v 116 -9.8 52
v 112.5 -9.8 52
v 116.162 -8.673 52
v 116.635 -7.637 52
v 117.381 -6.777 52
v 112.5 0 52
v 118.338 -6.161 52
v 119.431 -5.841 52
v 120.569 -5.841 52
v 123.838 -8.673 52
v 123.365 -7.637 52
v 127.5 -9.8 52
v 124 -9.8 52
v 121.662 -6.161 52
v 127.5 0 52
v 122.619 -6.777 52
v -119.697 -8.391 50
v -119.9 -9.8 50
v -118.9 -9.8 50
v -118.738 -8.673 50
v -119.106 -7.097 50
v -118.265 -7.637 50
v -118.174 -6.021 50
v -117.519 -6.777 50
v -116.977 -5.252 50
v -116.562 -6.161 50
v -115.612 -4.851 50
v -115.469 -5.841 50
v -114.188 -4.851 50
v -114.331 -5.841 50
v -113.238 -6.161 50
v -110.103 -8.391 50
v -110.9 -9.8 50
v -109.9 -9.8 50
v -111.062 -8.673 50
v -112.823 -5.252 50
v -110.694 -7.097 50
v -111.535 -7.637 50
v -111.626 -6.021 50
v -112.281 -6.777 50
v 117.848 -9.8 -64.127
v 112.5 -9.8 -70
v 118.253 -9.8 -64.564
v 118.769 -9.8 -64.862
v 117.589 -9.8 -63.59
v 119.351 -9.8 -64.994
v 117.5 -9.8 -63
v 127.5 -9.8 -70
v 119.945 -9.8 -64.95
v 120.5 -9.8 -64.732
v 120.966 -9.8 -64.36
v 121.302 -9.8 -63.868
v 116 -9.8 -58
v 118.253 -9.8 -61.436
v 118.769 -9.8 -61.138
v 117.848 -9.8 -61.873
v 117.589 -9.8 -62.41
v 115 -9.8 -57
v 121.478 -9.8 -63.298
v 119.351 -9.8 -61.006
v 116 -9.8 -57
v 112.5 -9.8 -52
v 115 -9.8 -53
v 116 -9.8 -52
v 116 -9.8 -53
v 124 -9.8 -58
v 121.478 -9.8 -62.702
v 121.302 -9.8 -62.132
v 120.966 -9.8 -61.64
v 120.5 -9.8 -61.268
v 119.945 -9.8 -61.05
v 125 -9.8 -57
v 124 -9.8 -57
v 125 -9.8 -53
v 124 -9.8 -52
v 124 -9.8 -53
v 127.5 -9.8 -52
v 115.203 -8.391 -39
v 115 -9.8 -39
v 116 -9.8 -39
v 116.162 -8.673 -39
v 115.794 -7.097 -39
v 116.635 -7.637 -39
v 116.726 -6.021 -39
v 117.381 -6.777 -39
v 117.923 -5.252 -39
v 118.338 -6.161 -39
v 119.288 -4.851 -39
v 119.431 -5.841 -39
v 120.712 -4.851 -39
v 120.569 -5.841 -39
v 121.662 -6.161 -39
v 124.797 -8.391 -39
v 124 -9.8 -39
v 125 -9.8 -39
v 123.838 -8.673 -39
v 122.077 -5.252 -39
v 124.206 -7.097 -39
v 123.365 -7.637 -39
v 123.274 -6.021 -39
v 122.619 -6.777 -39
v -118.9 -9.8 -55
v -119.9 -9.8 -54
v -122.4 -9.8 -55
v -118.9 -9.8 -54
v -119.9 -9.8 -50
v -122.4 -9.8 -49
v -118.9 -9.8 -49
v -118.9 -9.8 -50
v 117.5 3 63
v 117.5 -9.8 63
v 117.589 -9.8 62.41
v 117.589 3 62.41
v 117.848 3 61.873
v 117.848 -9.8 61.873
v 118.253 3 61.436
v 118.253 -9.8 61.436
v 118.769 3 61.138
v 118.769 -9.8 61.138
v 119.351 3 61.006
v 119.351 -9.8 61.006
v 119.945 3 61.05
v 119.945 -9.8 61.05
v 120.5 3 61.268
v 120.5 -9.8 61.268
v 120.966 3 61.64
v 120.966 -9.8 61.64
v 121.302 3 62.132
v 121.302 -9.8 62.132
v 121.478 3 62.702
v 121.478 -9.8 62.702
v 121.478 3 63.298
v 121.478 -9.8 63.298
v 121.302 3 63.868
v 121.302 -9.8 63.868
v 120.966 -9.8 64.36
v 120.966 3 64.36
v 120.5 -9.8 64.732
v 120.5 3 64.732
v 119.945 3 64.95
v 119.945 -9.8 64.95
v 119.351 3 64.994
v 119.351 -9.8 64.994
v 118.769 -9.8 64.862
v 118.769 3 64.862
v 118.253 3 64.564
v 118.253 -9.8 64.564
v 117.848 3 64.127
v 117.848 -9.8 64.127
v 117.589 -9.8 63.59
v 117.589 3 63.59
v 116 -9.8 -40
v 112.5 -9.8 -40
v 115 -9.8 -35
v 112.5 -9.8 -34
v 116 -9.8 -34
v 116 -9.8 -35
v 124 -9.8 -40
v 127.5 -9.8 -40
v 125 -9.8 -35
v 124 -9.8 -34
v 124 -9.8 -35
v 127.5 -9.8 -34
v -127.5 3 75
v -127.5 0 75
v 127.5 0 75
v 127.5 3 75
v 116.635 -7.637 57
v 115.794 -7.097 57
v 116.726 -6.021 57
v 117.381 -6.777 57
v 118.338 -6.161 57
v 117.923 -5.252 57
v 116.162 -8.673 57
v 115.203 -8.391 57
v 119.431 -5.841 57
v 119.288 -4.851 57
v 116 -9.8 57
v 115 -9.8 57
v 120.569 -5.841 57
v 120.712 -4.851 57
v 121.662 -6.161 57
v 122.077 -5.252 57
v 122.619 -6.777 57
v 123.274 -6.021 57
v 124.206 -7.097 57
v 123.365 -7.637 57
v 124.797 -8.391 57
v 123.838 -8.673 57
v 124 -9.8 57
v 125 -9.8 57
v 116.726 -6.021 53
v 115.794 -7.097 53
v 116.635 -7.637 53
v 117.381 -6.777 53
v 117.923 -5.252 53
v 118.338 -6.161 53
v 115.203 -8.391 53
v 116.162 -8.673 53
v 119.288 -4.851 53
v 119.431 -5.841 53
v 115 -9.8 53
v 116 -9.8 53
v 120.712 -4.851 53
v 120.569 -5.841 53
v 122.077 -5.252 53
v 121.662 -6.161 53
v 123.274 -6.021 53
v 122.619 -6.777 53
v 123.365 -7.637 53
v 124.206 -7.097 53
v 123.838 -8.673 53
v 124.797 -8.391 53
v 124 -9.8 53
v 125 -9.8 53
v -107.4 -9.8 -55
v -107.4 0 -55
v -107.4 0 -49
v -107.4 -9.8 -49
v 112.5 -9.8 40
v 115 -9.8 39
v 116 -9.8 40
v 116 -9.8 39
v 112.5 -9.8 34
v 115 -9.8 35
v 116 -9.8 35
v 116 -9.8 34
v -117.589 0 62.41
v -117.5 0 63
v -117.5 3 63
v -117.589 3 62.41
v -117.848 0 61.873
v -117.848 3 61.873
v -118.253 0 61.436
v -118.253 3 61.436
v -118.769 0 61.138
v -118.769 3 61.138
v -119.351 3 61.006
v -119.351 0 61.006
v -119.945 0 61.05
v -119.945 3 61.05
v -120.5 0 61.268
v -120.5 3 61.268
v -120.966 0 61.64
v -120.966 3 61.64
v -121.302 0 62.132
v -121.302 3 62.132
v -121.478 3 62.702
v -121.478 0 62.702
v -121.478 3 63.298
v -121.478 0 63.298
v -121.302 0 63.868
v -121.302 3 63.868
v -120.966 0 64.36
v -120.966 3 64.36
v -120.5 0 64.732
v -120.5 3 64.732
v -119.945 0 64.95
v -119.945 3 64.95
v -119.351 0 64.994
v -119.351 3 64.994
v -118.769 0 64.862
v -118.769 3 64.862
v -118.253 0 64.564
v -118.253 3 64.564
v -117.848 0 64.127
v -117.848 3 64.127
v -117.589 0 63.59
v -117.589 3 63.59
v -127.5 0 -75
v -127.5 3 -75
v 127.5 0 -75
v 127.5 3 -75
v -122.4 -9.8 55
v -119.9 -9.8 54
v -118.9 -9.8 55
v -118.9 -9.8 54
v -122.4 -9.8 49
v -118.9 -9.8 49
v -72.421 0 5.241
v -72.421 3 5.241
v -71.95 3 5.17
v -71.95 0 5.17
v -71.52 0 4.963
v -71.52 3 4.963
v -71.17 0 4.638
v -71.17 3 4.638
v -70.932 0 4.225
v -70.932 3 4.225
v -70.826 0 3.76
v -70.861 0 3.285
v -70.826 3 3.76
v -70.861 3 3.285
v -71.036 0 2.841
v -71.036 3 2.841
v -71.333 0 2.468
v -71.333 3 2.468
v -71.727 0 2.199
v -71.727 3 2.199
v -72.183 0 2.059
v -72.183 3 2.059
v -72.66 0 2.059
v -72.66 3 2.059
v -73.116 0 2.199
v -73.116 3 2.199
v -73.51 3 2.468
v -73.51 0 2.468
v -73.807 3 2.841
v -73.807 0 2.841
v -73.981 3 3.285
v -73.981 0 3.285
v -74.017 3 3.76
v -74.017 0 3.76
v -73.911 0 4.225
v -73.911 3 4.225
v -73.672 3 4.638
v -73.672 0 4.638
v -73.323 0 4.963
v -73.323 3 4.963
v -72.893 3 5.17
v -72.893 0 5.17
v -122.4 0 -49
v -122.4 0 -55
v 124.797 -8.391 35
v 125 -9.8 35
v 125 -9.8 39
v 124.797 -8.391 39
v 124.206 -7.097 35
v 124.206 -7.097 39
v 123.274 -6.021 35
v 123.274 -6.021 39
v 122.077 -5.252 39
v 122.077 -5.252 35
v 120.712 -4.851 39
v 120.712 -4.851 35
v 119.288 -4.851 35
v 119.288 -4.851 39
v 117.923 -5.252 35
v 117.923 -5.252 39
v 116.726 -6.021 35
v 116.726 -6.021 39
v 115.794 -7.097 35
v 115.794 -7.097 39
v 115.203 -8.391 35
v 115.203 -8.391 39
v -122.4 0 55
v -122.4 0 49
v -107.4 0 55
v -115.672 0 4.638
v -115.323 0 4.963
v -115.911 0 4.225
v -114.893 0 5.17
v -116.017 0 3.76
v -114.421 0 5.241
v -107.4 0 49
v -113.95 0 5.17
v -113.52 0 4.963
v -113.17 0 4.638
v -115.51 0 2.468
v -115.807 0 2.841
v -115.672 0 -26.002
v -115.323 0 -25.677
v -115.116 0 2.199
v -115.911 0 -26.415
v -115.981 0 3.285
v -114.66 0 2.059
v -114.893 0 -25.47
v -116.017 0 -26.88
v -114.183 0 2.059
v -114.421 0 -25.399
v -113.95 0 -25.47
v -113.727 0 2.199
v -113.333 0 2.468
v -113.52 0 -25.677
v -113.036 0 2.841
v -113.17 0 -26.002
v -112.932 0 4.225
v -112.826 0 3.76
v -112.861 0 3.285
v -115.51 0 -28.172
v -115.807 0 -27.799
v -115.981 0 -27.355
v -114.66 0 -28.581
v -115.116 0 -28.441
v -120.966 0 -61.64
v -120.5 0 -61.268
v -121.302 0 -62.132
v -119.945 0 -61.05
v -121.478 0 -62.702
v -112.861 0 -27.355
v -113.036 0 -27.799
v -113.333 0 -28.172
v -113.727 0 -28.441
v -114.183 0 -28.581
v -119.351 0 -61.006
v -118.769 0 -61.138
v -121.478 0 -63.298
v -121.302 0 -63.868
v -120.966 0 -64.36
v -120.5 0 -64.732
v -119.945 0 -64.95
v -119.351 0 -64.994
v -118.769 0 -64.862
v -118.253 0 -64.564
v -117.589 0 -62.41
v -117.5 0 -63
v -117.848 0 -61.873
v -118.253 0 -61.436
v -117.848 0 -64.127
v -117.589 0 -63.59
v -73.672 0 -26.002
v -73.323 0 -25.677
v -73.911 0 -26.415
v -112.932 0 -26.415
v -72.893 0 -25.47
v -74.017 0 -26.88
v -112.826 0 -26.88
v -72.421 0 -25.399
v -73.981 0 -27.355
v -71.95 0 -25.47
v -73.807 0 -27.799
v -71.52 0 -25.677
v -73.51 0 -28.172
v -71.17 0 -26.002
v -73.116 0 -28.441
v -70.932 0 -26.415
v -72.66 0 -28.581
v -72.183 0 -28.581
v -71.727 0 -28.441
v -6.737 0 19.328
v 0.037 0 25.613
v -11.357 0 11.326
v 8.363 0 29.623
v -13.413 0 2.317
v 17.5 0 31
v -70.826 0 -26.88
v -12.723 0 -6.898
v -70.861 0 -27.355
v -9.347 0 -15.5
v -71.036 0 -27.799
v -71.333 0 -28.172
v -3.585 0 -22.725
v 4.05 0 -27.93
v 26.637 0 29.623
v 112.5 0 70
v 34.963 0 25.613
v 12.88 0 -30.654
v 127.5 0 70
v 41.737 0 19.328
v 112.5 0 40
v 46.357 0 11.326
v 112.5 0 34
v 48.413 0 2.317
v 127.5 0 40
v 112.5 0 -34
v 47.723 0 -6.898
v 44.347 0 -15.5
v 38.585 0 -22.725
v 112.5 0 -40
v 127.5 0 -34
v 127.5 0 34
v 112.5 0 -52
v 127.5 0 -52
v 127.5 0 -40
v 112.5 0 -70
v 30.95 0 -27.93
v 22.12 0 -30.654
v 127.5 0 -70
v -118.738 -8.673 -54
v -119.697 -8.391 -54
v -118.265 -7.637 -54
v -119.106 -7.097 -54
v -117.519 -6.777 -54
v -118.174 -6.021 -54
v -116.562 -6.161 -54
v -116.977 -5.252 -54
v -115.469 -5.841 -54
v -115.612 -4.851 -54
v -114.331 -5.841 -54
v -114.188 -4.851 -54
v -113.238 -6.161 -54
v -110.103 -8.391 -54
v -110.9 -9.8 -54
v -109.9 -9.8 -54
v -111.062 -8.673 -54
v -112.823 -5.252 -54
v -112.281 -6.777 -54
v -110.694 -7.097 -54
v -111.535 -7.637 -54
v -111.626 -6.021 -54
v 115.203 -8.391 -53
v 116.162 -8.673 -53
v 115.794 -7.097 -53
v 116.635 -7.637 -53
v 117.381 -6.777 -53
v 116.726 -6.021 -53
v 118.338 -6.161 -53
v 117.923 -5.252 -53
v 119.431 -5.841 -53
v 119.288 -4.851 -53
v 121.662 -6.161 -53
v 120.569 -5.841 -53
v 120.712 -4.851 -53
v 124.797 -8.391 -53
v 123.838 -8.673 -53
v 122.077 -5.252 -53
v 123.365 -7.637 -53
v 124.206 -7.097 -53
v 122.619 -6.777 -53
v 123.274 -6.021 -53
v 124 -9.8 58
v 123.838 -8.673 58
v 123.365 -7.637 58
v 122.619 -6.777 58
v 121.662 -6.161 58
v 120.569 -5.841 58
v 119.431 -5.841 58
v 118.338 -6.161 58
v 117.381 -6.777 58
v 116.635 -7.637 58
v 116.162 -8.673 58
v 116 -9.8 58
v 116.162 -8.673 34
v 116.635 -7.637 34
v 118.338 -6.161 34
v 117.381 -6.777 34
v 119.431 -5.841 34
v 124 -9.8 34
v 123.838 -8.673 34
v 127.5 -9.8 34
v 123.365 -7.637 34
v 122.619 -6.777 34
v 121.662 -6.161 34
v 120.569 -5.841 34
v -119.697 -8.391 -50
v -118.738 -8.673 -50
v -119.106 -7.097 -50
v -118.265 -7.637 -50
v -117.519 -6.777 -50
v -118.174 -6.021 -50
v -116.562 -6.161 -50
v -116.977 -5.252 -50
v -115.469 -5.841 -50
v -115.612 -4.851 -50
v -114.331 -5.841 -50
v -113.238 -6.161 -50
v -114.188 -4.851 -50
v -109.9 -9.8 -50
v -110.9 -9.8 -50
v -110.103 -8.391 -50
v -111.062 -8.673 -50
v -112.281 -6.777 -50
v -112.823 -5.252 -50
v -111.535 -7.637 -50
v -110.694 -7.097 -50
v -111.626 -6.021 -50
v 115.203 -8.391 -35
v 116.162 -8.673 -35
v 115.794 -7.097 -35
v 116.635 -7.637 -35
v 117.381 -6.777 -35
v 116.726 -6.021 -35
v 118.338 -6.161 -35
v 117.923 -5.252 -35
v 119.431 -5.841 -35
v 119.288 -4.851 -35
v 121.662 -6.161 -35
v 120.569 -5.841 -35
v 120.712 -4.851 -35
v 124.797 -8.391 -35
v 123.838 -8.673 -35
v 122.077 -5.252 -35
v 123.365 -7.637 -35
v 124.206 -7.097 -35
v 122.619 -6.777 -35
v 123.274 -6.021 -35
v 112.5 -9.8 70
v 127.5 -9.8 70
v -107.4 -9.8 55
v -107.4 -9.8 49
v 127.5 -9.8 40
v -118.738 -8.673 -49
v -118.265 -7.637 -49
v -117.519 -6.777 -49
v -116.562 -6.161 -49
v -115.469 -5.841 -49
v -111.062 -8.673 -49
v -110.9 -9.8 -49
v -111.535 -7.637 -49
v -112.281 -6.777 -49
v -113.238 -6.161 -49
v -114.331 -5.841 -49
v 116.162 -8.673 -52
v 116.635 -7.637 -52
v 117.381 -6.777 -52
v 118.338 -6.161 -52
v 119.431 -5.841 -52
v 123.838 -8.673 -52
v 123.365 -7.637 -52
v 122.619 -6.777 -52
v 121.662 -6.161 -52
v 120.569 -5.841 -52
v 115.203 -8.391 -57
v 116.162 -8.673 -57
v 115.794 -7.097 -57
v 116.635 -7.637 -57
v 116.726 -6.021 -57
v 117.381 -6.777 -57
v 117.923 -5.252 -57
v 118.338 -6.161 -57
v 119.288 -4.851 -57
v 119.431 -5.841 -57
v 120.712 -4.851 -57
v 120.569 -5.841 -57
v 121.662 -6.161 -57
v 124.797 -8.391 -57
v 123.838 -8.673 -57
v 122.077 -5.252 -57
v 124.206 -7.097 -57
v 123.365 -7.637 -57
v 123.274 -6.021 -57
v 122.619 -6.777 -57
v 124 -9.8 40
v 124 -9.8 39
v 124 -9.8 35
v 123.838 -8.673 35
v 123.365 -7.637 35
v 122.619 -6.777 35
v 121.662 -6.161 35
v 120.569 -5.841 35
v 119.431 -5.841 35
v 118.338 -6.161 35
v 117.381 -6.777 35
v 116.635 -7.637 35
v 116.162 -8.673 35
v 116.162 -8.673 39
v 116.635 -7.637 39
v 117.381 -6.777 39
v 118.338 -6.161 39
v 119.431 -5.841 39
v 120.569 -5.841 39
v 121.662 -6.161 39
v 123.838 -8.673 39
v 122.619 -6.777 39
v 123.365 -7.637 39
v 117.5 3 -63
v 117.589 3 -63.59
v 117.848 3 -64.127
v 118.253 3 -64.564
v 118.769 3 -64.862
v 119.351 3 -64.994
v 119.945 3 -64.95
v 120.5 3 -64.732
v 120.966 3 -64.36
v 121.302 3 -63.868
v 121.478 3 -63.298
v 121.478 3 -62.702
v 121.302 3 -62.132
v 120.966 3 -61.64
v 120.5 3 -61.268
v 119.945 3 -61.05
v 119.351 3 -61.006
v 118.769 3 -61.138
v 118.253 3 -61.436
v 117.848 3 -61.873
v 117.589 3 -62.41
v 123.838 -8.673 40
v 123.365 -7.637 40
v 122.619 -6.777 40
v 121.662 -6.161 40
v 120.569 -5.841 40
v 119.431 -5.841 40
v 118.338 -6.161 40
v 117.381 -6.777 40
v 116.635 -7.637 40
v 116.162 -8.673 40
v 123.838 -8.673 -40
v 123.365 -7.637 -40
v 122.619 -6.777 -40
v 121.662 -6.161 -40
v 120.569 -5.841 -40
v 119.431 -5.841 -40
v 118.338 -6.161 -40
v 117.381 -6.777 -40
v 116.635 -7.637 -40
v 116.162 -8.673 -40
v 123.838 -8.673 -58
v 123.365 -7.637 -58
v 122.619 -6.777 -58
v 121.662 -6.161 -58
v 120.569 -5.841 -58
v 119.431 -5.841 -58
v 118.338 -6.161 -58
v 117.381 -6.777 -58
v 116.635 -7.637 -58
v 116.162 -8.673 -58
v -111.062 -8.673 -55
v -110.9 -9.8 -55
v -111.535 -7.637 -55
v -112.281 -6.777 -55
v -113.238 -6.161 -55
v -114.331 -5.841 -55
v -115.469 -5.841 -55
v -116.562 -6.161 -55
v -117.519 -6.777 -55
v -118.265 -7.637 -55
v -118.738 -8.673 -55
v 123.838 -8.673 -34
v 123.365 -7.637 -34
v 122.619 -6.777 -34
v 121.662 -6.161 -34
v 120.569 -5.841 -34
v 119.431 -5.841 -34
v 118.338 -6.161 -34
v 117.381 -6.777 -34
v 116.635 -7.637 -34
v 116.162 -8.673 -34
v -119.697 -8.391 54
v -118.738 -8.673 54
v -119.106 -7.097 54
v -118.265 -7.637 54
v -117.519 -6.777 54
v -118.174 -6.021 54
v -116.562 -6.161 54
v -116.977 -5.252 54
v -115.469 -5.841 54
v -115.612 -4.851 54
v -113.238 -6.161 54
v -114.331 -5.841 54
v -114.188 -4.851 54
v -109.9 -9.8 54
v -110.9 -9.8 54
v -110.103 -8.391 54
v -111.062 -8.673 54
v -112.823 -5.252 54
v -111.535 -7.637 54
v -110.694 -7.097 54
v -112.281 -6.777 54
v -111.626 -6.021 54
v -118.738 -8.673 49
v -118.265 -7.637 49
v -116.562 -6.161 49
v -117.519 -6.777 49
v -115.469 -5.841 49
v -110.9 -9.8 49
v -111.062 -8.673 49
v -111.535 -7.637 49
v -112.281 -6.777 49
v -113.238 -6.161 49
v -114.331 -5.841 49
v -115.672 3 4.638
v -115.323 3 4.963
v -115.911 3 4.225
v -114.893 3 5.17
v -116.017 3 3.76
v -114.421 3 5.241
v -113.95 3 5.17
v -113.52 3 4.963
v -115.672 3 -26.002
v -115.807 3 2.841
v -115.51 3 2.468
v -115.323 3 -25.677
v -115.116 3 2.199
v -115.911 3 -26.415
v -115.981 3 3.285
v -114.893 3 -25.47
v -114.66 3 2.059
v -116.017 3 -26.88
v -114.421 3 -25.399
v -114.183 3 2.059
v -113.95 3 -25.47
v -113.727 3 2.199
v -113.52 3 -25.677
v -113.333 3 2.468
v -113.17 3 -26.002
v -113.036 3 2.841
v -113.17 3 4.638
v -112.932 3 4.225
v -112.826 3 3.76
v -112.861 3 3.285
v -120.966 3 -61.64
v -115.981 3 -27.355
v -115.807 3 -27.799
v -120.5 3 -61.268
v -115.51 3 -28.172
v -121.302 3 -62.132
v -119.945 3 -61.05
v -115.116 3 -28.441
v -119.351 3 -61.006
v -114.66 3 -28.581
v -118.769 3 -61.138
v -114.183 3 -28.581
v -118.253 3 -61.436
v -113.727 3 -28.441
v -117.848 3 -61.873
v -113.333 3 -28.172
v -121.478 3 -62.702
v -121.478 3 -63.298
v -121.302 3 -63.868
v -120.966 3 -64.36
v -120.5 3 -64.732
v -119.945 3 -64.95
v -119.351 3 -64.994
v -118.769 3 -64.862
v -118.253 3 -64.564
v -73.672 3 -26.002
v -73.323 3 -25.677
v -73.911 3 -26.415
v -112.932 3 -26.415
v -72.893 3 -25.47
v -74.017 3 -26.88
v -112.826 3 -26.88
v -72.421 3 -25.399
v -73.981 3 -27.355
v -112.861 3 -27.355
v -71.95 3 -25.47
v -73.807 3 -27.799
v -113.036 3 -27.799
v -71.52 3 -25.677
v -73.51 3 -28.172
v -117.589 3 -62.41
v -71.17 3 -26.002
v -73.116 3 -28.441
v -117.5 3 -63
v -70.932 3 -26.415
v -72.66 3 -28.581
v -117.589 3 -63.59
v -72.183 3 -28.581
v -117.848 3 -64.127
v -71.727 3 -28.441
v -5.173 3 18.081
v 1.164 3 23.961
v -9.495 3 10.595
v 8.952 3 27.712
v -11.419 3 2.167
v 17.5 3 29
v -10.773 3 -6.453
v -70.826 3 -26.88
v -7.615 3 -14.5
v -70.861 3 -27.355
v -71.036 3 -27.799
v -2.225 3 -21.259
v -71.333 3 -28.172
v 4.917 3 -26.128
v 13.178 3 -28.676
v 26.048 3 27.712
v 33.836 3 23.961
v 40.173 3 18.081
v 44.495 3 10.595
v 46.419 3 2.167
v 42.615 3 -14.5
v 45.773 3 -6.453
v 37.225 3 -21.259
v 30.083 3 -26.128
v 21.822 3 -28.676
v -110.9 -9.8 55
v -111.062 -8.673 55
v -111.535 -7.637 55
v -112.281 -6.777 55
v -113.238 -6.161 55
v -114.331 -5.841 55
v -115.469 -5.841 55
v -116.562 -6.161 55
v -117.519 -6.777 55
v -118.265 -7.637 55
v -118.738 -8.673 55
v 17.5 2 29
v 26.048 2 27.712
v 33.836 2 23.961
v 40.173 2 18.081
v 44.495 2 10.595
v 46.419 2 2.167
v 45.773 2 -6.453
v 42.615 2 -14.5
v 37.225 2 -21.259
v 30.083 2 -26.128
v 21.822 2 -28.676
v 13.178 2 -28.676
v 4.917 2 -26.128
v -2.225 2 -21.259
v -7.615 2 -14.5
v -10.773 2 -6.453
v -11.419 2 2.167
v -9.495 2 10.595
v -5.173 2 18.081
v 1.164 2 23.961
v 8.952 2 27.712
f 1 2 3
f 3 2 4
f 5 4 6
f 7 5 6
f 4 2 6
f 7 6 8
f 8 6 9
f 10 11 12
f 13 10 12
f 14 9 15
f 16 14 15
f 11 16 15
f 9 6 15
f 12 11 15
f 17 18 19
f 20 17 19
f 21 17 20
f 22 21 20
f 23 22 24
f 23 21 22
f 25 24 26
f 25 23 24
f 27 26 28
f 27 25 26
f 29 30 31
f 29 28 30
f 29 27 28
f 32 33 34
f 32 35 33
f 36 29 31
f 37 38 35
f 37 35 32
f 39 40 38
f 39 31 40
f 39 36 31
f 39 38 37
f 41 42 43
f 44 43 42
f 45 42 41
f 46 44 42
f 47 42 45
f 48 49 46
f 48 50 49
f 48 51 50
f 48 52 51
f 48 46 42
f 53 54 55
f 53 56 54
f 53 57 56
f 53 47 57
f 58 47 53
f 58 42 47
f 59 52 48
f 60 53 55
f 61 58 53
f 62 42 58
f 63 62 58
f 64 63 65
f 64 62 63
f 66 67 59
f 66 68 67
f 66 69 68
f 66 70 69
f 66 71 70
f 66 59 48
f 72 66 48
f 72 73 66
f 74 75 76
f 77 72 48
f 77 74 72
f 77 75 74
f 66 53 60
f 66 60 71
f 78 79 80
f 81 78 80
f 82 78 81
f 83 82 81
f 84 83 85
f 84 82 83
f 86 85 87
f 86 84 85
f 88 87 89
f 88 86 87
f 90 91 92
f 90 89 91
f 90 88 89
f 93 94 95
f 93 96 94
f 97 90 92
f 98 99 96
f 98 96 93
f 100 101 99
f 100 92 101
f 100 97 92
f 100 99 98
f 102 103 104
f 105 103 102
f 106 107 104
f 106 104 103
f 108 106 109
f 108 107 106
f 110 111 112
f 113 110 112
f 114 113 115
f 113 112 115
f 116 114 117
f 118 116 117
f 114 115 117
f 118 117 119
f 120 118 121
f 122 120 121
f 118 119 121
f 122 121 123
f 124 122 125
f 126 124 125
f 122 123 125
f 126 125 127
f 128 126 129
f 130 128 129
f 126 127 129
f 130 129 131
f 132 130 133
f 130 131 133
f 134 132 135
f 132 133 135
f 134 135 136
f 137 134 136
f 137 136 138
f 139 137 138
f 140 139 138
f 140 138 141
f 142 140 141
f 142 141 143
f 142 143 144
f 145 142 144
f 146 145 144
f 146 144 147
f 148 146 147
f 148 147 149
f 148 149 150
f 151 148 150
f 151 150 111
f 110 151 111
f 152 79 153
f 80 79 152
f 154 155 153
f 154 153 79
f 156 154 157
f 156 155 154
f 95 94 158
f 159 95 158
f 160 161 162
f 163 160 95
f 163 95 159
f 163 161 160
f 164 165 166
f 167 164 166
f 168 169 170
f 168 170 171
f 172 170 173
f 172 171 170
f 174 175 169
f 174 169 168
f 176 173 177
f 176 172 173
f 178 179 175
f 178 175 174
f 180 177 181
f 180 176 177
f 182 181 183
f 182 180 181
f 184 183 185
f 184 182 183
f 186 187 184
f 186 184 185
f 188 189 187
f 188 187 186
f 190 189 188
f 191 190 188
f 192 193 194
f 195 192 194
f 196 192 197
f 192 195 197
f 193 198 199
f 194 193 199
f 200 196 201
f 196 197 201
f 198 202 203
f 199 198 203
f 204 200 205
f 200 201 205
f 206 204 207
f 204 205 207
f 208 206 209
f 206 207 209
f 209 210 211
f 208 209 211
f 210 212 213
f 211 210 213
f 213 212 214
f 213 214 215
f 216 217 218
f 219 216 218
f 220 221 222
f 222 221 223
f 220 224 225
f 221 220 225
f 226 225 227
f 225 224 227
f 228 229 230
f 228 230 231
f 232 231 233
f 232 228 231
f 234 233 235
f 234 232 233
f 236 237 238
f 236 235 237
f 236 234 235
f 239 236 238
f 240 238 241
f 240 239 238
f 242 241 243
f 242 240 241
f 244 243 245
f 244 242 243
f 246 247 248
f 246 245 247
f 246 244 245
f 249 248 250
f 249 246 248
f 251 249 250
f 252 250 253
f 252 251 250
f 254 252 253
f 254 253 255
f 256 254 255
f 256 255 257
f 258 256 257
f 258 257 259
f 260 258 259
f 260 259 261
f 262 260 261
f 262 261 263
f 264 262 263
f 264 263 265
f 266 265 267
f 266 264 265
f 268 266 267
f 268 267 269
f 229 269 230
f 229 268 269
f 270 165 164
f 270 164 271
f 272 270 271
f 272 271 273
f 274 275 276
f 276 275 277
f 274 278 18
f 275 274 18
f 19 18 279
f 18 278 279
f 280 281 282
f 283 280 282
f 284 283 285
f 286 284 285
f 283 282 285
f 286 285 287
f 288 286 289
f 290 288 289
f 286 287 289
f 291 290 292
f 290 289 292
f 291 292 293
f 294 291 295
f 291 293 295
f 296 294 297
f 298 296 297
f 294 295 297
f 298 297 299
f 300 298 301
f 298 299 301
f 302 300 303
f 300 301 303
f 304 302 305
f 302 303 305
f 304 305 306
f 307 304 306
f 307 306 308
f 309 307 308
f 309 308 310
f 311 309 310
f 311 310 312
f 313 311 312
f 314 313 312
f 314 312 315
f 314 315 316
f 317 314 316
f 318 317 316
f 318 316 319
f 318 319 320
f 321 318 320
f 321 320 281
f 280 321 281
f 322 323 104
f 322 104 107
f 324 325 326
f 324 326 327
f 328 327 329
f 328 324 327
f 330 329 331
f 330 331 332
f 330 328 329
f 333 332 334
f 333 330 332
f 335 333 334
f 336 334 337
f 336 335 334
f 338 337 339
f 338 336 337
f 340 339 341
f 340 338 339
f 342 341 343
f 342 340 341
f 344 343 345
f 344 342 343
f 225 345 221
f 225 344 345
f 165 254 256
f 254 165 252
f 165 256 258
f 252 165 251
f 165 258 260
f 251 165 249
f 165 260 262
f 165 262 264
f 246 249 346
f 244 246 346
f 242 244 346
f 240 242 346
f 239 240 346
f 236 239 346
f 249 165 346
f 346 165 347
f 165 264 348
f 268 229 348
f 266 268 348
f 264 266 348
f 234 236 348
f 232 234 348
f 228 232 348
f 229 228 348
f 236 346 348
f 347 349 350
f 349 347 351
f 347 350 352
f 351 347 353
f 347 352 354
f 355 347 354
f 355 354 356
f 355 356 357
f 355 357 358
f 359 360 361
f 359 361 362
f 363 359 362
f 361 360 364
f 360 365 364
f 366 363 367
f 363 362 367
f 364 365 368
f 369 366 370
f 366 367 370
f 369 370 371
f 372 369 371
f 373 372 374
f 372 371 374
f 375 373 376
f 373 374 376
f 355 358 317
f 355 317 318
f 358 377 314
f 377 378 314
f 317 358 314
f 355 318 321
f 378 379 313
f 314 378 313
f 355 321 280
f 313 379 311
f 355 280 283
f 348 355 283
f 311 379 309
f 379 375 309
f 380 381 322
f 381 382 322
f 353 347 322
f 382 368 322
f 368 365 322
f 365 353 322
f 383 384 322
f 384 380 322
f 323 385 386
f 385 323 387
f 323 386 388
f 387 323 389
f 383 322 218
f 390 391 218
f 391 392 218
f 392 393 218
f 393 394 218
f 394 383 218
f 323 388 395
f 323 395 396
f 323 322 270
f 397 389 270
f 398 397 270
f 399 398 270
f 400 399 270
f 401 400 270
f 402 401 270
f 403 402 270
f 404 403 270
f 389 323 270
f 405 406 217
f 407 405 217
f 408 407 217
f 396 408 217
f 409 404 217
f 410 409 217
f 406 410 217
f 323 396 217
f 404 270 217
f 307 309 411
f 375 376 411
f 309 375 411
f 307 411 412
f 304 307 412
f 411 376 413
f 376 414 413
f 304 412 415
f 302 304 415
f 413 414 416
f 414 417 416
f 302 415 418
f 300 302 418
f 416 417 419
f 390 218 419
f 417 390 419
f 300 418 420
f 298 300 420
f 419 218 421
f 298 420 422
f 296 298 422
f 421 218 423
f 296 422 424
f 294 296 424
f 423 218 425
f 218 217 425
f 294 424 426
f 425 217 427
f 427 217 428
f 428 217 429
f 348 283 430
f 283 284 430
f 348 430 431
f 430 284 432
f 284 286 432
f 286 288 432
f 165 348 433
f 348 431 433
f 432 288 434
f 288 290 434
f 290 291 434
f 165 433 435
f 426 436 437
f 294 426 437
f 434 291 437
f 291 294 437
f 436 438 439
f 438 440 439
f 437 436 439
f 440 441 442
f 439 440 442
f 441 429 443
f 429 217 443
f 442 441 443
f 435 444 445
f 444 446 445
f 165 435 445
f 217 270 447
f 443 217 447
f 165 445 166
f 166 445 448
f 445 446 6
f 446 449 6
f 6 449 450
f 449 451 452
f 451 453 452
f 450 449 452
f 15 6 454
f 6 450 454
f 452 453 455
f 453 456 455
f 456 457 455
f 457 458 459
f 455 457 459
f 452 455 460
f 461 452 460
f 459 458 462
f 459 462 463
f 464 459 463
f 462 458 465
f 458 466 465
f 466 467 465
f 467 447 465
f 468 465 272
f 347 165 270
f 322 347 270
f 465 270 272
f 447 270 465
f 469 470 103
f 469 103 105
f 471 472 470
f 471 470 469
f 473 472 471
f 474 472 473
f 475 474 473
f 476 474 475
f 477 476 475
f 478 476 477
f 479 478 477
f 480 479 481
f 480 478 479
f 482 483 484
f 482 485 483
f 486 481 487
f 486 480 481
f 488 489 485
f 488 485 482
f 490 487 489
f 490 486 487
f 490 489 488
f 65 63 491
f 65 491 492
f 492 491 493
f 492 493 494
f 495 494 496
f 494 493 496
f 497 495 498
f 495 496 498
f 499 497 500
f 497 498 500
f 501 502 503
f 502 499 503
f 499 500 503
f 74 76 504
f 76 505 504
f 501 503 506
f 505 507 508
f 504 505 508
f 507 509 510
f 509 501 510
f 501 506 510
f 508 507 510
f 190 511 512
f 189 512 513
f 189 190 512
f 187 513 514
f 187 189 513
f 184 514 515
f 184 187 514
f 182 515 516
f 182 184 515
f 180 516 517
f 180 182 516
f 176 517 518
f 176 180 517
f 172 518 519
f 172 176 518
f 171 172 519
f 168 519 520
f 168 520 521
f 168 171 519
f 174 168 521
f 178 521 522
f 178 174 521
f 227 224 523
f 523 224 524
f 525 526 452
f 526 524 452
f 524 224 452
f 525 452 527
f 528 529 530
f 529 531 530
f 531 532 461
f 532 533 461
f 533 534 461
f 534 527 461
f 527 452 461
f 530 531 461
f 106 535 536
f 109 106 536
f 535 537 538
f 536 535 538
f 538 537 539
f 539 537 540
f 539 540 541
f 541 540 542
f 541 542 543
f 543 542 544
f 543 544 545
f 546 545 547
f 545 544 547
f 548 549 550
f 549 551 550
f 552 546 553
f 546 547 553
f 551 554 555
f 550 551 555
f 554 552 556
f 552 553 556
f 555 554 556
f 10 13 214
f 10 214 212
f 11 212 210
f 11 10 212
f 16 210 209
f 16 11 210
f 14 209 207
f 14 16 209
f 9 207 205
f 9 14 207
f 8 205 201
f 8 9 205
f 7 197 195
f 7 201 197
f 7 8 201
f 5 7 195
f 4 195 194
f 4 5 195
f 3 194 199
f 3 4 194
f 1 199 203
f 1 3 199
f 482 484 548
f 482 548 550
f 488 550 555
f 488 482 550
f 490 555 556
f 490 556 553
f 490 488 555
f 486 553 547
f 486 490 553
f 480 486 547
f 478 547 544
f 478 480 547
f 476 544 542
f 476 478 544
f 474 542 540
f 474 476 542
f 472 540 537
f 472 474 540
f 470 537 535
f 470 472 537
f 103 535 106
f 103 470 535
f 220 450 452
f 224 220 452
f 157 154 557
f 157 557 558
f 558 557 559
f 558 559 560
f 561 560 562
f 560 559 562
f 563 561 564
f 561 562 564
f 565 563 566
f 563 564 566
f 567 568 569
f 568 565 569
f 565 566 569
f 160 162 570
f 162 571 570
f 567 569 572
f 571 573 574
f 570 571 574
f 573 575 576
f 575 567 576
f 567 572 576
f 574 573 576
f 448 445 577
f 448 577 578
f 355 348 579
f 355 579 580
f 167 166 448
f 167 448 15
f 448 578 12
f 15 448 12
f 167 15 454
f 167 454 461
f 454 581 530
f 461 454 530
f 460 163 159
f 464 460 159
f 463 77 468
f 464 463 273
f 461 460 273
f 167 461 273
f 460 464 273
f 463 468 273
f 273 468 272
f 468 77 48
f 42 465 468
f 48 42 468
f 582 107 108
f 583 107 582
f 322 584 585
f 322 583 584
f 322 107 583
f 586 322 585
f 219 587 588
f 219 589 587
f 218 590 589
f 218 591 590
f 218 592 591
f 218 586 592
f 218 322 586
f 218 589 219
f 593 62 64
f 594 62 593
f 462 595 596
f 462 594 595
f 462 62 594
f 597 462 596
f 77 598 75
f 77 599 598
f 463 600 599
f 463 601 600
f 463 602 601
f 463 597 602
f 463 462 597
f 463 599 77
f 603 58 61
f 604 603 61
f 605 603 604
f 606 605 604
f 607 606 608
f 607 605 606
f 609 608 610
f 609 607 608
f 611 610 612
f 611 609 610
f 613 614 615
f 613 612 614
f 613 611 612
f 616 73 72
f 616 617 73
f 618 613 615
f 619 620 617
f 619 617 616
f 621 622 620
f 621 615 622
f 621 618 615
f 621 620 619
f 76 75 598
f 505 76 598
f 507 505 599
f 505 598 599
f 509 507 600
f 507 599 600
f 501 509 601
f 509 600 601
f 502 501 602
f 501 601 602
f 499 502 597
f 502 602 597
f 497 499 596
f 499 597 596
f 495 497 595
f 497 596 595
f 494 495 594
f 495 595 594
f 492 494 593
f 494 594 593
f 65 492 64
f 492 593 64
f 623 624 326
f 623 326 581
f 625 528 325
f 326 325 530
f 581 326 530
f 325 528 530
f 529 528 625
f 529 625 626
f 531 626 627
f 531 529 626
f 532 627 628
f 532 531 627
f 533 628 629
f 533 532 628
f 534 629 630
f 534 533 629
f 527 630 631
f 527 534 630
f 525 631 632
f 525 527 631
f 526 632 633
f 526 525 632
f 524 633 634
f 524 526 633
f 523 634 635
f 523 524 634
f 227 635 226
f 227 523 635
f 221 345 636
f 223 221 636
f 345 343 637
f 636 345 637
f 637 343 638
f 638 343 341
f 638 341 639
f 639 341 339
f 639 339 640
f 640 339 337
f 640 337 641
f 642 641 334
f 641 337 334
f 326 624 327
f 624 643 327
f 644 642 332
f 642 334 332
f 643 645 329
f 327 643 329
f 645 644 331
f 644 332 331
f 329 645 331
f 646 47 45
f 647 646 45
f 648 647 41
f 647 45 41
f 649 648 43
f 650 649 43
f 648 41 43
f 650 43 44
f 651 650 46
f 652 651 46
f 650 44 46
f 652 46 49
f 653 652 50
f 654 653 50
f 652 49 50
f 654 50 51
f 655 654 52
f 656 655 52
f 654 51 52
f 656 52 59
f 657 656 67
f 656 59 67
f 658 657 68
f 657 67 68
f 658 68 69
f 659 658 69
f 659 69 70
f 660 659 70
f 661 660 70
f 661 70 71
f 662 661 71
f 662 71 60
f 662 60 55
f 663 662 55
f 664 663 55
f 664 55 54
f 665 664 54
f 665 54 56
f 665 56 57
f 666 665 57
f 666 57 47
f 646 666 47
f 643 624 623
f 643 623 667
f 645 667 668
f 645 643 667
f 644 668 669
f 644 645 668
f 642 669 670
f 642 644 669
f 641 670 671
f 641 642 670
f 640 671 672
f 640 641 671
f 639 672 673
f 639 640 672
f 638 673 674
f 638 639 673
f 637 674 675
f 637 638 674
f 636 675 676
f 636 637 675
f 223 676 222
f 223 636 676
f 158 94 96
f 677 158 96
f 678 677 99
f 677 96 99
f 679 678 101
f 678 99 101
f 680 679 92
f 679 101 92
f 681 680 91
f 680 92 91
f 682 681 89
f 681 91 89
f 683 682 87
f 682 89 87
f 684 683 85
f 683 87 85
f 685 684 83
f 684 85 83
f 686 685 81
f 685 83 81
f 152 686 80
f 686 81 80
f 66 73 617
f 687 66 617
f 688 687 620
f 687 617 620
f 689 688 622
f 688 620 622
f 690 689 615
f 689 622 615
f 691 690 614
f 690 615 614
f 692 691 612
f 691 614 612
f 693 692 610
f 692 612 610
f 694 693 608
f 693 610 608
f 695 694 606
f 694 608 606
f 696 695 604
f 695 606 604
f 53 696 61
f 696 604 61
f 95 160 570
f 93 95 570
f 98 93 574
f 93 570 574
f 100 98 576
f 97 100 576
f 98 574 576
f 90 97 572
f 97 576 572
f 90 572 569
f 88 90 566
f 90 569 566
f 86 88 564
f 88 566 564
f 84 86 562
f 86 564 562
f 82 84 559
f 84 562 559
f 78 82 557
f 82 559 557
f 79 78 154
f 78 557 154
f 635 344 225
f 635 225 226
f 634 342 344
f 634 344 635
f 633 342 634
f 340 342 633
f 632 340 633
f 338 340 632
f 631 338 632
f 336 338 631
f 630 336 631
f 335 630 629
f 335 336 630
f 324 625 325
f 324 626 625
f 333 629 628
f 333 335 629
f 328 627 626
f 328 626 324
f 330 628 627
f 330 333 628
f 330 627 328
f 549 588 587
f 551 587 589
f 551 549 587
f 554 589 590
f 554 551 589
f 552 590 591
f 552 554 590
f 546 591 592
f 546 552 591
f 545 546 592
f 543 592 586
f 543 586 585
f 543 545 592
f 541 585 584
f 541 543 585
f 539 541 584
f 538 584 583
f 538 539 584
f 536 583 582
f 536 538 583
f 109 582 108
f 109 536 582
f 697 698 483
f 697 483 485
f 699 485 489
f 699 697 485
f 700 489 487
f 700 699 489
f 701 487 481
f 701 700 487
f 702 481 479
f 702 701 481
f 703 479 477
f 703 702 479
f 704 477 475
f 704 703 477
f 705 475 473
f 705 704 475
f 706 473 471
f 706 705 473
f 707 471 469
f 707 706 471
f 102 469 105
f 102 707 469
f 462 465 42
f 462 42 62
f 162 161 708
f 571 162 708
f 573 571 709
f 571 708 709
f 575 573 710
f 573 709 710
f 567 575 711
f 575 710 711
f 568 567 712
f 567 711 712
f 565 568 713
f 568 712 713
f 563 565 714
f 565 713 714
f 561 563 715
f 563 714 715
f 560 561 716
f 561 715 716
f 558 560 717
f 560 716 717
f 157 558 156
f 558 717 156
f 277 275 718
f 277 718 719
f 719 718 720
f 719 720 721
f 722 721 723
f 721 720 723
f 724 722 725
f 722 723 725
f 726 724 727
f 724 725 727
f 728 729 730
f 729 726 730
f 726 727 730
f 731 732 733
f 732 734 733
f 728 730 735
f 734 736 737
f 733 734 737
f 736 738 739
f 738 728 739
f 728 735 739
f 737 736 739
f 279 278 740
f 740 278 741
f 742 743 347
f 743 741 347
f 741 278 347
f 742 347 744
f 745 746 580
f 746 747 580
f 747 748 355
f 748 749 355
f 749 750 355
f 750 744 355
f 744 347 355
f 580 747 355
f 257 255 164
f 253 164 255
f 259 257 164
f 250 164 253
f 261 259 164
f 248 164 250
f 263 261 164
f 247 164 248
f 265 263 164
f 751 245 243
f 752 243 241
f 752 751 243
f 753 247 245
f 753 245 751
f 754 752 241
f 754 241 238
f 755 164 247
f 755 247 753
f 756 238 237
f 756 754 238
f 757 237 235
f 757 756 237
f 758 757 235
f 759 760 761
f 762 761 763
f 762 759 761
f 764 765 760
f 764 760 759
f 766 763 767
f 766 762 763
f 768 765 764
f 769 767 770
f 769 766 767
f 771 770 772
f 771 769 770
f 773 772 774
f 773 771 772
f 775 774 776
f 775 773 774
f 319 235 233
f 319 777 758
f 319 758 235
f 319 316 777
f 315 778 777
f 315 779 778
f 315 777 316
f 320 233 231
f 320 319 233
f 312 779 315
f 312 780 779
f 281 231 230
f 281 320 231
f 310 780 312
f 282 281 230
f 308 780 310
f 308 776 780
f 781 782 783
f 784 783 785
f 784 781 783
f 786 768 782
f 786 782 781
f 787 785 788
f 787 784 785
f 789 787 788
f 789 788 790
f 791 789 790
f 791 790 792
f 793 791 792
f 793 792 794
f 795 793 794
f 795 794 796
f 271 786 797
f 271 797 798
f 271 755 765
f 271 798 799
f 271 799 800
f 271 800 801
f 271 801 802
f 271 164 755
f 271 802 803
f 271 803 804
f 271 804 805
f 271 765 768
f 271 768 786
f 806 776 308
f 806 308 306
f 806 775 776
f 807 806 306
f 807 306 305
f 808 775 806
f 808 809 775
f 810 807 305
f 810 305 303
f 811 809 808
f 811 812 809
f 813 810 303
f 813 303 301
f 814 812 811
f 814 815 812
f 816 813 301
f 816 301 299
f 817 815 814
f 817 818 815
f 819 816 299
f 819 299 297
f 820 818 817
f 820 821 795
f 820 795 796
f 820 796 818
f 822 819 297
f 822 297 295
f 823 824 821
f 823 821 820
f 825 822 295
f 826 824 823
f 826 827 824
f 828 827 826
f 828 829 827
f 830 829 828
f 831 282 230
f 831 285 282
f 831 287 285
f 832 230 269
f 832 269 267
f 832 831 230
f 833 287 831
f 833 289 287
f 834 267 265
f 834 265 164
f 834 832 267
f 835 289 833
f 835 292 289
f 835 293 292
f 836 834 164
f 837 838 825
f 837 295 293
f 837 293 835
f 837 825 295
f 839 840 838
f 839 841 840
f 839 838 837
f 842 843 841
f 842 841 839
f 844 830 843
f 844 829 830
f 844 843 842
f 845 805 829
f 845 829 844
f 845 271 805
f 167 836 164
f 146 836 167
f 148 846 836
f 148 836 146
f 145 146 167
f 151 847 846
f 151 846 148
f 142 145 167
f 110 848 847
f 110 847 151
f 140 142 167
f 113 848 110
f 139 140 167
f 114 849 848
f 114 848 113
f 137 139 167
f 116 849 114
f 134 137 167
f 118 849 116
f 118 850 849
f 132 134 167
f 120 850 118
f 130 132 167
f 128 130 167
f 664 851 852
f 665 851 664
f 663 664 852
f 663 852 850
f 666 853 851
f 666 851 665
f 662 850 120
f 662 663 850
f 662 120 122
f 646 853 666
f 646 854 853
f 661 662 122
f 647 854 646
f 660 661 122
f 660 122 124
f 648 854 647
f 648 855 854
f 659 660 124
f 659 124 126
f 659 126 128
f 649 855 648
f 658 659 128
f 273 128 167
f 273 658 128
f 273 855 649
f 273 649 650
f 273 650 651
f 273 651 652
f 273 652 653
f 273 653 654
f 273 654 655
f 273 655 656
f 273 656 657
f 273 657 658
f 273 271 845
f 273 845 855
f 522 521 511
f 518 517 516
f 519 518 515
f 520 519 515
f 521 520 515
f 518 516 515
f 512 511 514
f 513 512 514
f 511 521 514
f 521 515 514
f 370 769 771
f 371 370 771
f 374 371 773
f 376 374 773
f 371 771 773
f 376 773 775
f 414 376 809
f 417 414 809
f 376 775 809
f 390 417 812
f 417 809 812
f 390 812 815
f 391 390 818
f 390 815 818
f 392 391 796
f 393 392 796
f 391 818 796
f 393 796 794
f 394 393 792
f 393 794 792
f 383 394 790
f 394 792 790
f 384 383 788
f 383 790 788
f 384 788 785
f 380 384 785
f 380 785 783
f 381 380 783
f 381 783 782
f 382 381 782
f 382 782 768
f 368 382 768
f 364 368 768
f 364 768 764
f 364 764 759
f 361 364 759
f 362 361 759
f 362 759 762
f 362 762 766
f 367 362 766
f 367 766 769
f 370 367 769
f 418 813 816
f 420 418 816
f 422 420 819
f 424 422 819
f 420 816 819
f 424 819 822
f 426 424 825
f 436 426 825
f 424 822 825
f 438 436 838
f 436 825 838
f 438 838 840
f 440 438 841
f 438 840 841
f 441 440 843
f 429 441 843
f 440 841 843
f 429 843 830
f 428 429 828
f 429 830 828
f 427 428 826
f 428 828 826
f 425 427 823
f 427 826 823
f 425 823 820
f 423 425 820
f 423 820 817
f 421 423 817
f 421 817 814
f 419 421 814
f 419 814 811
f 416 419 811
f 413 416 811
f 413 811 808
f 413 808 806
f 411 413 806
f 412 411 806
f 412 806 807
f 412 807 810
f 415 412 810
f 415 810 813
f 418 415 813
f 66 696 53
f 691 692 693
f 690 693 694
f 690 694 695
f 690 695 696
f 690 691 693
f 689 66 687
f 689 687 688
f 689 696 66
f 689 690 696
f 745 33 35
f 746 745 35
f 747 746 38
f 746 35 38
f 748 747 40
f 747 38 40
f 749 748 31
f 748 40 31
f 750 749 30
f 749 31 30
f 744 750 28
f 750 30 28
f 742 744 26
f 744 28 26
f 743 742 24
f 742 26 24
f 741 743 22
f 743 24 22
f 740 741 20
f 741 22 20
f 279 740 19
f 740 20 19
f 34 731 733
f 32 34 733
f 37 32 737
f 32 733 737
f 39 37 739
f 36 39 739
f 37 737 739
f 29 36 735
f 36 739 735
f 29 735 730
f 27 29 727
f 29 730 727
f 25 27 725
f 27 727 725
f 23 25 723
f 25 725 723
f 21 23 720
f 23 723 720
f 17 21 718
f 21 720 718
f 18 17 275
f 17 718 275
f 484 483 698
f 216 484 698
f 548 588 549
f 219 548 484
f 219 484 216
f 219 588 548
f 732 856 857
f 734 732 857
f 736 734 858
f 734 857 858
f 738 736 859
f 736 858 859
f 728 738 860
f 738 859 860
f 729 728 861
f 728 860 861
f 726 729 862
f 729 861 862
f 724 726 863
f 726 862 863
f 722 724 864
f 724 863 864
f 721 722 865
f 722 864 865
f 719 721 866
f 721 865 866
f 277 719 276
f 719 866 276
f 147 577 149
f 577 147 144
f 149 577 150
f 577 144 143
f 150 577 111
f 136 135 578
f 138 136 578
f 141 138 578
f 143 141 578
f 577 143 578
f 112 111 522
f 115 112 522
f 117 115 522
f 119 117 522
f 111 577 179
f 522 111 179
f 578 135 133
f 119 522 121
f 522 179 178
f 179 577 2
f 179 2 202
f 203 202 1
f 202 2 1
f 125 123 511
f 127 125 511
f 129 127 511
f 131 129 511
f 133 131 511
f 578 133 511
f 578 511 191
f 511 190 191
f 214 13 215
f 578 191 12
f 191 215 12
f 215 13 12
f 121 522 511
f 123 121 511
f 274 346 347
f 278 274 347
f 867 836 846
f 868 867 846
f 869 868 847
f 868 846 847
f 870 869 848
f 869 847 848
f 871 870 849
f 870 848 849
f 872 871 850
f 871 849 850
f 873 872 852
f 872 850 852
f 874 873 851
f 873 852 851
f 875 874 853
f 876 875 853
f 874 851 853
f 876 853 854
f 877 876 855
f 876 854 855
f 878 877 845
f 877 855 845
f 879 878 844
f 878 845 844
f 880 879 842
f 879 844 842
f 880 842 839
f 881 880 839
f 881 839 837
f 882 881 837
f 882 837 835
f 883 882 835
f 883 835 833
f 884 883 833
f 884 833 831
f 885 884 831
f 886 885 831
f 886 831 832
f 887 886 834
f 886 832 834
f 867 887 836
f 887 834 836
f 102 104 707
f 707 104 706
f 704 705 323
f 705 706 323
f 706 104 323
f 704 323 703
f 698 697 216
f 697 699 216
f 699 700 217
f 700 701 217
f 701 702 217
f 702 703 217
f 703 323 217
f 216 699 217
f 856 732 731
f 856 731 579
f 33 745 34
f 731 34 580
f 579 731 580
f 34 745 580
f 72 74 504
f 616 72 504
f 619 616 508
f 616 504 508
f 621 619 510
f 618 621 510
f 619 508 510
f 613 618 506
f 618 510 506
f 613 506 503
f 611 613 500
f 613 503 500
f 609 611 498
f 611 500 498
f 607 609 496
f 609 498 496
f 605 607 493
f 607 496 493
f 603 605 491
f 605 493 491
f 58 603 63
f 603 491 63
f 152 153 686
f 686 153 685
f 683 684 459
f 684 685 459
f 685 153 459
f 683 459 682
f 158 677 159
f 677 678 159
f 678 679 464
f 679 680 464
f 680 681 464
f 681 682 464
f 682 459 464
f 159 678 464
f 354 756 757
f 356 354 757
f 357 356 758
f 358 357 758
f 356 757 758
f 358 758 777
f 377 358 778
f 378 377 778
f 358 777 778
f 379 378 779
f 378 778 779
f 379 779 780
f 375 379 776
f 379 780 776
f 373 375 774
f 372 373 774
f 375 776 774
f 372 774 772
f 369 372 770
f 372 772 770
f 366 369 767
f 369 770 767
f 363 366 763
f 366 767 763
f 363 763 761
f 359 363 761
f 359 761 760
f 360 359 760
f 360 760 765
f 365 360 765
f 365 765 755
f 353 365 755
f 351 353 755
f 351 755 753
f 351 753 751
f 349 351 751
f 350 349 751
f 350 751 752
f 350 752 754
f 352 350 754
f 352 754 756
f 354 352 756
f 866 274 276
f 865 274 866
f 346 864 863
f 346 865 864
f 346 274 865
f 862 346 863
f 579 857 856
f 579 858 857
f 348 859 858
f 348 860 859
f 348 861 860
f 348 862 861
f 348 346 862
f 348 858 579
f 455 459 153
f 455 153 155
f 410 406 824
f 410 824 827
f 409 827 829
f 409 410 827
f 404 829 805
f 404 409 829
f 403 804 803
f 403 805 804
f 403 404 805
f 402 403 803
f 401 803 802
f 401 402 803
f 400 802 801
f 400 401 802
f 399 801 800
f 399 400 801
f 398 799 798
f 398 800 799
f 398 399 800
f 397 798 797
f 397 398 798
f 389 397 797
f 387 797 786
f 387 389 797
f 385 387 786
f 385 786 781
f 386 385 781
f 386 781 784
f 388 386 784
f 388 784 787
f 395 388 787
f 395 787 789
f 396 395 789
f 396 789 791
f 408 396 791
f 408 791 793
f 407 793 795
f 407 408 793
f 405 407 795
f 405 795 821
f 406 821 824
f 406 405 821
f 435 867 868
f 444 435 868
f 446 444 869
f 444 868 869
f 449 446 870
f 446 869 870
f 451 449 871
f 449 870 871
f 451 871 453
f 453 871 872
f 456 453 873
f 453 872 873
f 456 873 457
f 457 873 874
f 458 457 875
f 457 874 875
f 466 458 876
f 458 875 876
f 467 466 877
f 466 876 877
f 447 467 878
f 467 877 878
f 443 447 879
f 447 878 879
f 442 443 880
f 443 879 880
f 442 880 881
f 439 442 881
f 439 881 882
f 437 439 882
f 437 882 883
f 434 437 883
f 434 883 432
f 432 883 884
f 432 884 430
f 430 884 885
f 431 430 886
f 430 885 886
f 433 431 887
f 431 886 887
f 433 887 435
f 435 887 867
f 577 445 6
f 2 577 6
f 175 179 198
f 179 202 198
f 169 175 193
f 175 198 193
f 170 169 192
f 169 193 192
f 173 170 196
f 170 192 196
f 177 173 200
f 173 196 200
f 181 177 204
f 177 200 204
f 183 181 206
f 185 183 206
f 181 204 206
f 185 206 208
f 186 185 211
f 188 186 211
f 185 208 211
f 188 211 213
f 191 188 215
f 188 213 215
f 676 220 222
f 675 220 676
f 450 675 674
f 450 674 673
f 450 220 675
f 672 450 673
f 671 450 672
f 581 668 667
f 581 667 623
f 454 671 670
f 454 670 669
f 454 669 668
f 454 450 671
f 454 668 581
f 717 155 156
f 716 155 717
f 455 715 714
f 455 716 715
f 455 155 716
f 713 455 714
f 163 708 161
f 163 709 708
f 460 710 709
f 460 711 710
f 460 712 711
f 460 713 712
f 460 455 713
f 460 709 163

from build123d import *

# Parameters (mm, degrees)
SKETCH1_W               = 255
SKETCH1_H               = 150
BOSS_EXTRUDE1_DEPTH     = 3
SKETCH3_R               = 29
CUT_EXTRUDE2_DEPTH      = 3
CUT_EXTRUDE3_REACH      = 149.954
SKETCH4_R               = 1.6
SKETCH5_W               = 15
SKETCH5_H               = 6
BOSS_EXTRUDE2_DEPTH     = 9.8
CUT_EXTRUDE4_REACH      = 184.352
SKETCH6_R               = 4
SKETCH7_R               = 5
CUT_EXTRUDE5_DEPTH      = 2
SKETCH8_W               = 15
SKETCH8_H               = 18
SKETCH8_H_2             = 6
BOSS_EXTRUDE3_DEPTH     = 9.8
SKETCH9_R               = 4
CUT_EXTRUDE6_DEPTH      = 24
SKETCH10_R              = 5
CUT_EXTRUDE7_DEPTH      = 2
LPATTERN1_COUNT         = 2
LPATTERN1_PITCH         = 18
MIRROR2_COPY_1_SKETCH_R = 5
MIRROR2_COPY_1_DEPTH    = 2
CHAMFER1_SIZE           = 2
F_4_0MM_DOWEL_HOLE1_D   = 4


with BuildPart() as part:
    # Sketch1 → Boss-Extrude1 (new body)
    with BuildSketch(Plane(origin=(0, 0, 0), x_dir=(1, 0, 0), z_dir=(0, 1, 0))):
        Rectangle(SKETCH1_W, SKETCH1_H)
    extrude(amount=BOSS_EXTRUDE1_DEPTH)

    # Sketch3 → Cut-Extrude2 (cut)
    with BuildSketch(Plane(origin=(0, 3, 0), x_dir=(1, 0, 0), z_dir=(0, 1, 0))):
        with Locations(Location((17.5, 0, 0), (0, 0, 270))):
            Circle(SKETCH3_R)
    extrude(amount=-CUT_EXTRUDE2_DEPTH, mode=Mode.SUBTRACT)

    # Sketch4 → Cut-Extrude3 (cut, up to next)
    with BuildSketch(Plane(origin=(0, 3, 0), x_dir=(1, 0, 0), z_dir=(0, 1, 0)), mode=Mode.PRIVATE) as cut_extrude3_sk1:
        with Locations(Location((-72.421312687, -3.64086936, 0), (0, 0, 270))):
            Circle(SKETCH4_R)
    cut_extrude3_tool1 = extrude(cut_extrude3_sk1.sketch, amount=-CUT_EXTRUDE3_REACH, mode=Mode.PRIVATE) & part.part
    # Sketch4 → Cut-Extrude3 (cut, up to next)
    with BuildSketch(Plane(origin=(0, 3, 0), x_dir=(1, 0, 0), z_dir=(0, 1, 0)), mode=Mode.PRIVATE) as cut_extrude3_sk2:
        with Locations(Location((-72.421312687, 26.99913064, 0), (0, 0, 270))):
            Circle(SKETCH4_R)
    cut_extrude3_tool2 = extrude(cut_extrude3_sk2.sketch, amount=-CUT_EXTRUDE3_REACH, mode=Mode.PRIVATE) & part.part
    # Sketch4 → Cut-Extrude3 (cut, up to next)
    with BuildSketch(Plane(origin=(0, 3, 0), x_dir=(1, 0, 0), z_dir=(0, 1, 0)), mode=Mode.PRIVATE) as cut_extrude3_sk3:
        with Locations(Location((-114.421312687, -3.64086936, 0), (0, 0, 270))):
            Circle(SKETCH4_R)
    cut_extrude3_tool3 = extrude(cut_extrude3_sk3.sketch, amount=-CUT_EXTRUDE3_REACH, mode=Mode.PRIVATE) & part.part
    # Sketch4 → Cut-Extrude3 (cut, up to next)
    with BuildSketch(Plane(origin=(0, 3, 0), x_dir=(1, 0, 0), z_dir=(0, 1, 0)), mode=Mode.PRIVATE) as cut_extrude3_sk4:
        with Locations(Location((-114.421312687, 26.99913064, 0), (0, 0, 270))):
            Circle(SKETCH4_R)
    cut_extrude3_tool4 = extrude(cut_extrude3_sk4.sketch, amount=-CUT_EXTRUDE3_REACH, mode=Mode.PRIVATE) & part.part
    add(cut_extrude3_tool1.solids().sort_by_distance((-72.421313, 3, 3.640869))[0], mode=Mode.SUBTRACT)
    add(cut_extrude3_tool2.solids().sort_by_distance((-72.421313, 3, -26.999131))[0], mode=Mode.SUBTRACT)
    add(cut_extrude3_tool3.solids().sort_by_distance((-114.421313, 3, 3.640869))[0], mode=Mode.SUBTRACT)
    add(cut_extrude3_tool4.solids().sort_by_distance((-114.421313, 3, -26.999131))[0], mode=Mode.SUBTRACT)

    # Sketch5 → Boss-Extrude2 (add)
    with BuildSketch(Plane(origin=(0, 0, 0), x_dir=(1, 0, 0), z_dir=(0, 1, 0))):
        with Locations((-114.9, -52)):
            Rectangle(SKETCH5_W, SKETCH5_H)
    boss_extrude2 = extrude(amount=-BOSS_EXTRUDE2_DEPTH)

    # Sketch6 → Cut-Extrude4 (cut, up to next)
    with BuildSketch(Plane.XY.offset(55), mode=Mode.PRIVATE) as cut_extrude4_sk1:
        with Locations((-114.9, -9.8)):
            Circle(SKETCH6_R)
    cut_extrude4_tool1 = extrude(cut_extrude4_sk1.sketch, amount=-CUT_EXTRUDE4_REACH, mode=Mode.PRIVATE) & part.part
    cut_extrude4 = cut_extrude4_tool1.solids().sort_by_distance((-114.9, -9.8, 55))[0]
    add(cut_extrude4, mode=Mode.SUBTRACT)

    # Sketch7 → Cut-Extrude5 (cut, symmetric)
    with BuildSketch(Plane.XY.offset(52)):
        with Locations((-114.9, -9.8)):
            Circle(SKETCH7_R)
    cut_extrude5 = extrude(amount=CUT_EXTRUDE5_DEPTH, both=True, mode=Mode.SUBTRACT)

    # Mirror1: Boss-Extrude2, Cut-Extrude4, Cut-Extrude5 across plane
    add(boss_extrude2.mirror(Plane.XY))
    add(cut_extrude4.mirror(Plane.XY), mode=Mode.SUBTRACT)
    add(cut_extrude5.mirror(Plane.XY), mode=Mode.SUBTRACT)

    # Sketch8 → Boss-Extrude3 (add)
    with BuildSketch(Plane.XZ):
        with Locations((120, -61)):
            Rectangle(SKETCH8_W, SKETCH8_H)
        with Locations((120, -37)):
            Rectangle(SKETCH8_W, SKETCH8_H_2)
    boss_extrude3 = extrude(amount=BOSS_EXTRUDE3_DEPTH)

    # Sketch9 → Cut-Extrude6 (cut)
    with BuildSketch(Plane.XY.offset(-34)):
        with Locations((120, -9.8)):
            Circle(SKETCH9_R)
    cut_extrude6 = extrude(amount=-CUT_EXTRUDE6_DEPTH, mode=Mode.SUBTRACT)

    # Sketch10 → Cut-Extrude7 (cut, symmetric)
    with BuildSketch(Plane.XY.offset(-37)):
        with Locations((120, -9.8)):
            Circle(SKETCH10_R)
    cut_extrude7 = extrude(amount=CUT_EXTRUDE7_DEPTH, both=True, mode=Mode.SUBTRACT)

    # LPattern1: Cut-Extrude7 ×2
    with Locations(*[(0, 0, -i * LPATTERN1_PITCH) for i in range(1, LPATTERN1_COUNT)]):
        add(cut_extrude7, mode=Mode.SUBTRACT)

    # Mirror2: Boss-Extrude3, Cut-Extrude6, Cut-Extrude7 across plane
    add(boss_extrude3.mirror(Plane.XY))
    add(cut_extrude6.mirror(Plane.XY), mode=Mode.SUBTRACT)
    add(cut_extrude7.mirror(Plane.XY), mode=Mode.SUBTRACT)

    # Mirror2 copy 1 sketch → Mirror2 copy 1 (cut, symmetric)
    with BuildSketch(Plane(origin=(0, 0, 55), x_dir=(1, 0, 0), z_dir=(0, 0, -1))):
        with Locations((120, 9.8)):
            Circle(MIRROR2_COPY_1_SKETCH_R)
    extrude(amount=MIRROR2_COPY_1_DEPTH, both=True, mode=Mode.SUBTRACT)

    # Chamfer1
    chamfer1_edges = [part.edges().sort_by_distance(p)[0] for p in [
        (17.5, 0, -29),
    ]]
    chamfer(chamfer1_edges, length=CHAMFER1_SIZE)

    # Ø4.0mm Dowel Hole1 (through all)
    with Locations(Plane(origin=(0, 3, 0), x_dir=(1, 0, 0), z_dir=(0, 1, 0))):
        with Locations((119.5, -63), (119.5, 63)):
            f_4_0mm_dowel_hole1 = Hole(F_4_0MM_DOWEL_HOLE1_D / 2)

    # Mirror3: Ø4.0mm Dowel Hole1 across plane
    add(f_4_0mm_dowel_hole1.mirror(Plane(origin=(0, 0, 0), x_dir=(0, 0, 1), z_dir=(1, 0, 0))), mode=Mode.SUBTRACT)


solid = part.part
